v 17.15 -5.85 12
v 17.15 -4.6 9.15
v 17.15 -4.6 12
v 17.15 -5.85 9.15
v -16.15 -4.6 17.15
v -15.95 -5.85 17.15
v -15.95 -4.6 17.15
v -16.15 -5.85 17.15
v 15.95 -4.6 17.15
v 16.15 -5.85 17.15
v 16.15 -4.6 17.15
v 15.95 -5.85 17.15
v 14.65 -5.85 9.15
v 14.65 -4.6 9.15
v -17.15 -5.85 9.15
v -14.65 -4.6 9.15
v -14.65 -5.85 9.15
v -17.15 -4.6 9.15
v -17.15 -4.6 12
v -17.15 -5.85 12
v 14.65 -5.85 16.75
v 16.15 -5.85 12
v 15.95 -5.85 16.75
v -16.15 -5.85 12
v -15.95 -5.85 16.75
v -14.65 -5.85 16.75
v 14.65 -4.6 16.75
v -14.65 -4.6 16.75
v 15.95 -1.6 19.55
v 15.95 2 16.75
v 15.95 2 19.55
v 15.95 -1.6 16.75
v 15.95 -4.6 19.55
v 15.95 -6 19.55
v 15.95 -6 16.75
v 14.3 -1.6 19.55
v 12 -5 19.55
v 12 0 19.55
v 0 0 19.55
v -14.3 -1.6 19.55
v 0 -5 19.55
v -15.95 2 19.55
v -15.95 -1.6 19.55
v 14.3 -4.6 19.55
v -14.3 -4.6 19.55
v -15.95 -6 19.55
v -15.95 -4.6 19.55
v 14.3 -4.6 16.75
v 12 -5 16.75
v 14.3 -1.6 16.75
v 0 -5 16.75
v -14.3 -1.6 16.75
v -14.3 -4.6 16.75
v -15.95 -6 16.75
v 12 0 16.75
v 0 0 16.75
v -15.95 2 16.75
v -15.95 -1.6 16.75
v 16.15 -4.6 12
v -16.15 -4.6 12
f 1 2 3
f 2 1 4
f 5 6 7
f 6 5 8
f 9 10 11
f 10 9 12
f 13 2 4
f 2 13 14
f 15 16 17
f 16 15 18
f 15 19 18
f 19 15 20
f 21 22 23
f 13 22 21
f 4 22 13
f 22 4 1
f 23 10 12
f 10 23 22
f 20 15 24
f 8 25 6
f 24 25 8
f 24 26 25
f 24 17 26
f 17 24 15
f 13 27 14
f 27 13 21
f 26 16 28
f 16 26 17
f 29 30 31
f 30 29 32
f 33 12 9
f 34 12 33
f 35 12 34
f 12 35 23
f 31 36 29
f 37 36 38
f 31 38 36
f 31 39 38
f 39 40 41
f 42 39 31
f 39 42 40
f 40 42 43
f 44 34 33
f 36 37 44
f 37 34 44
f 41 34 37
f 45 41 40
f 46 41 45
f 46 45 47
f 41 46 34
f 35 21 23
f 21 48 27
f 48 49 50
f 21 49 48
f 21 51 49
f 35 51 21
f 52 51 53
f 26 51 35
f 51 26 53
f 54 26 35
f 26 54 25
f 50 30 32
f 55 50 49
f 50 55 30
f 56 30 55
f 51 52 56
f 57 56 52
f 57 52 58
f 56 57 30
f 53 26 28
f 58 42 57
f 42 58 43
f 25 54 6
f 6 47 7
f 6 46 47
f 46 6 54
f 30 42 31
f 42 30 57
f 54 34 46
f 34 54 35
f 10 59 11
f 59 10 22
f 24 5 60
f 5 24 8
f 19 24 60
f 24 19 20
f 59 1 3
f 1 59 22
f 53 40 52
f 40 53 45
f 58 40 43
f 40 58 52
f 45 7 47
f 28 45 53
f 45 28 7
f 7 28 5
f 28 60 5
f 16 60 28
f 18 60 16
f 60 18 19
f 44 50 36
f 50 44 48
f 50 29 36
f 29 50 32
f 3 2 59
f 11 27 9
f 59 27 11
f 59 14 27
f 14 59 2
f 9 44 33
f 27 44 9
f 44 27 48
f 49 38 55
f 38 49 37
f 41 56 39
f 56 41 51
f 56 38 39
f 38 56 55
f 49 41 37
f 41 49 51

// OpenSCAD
// file: usb_screen.scad
//长宽高
ma=32.3;//横着
mb=34.3;//竖着
mc=4.2;//厚度

l1=1.6;//屏幕顶部
l2=2;//两边
l3=4.8;//屏幕底部

ll=3;//默认槽宽


difference()
{
    cube([ma+4,mc+4,mb+5],true);
    union()
    {
        cube([ma,mc,mb],true);//中间的空间
        translate([0,0,-1.5])//屏幕排线
            cube([ma-10,mc,mb],true);
        
        translate([0,3,0])//前面扣洞
            cube([ma-l2*2,mc,mb-l3*2],true);
        translate([0,3,mb/4])//前面再扣洞
            cube([ma-l2*2,mc,mb/2-l2*2],true);
        translate([0,-3,0])//背面扣洞
            cube([ma-ll,mc,mb-ll],true);
        
        translate([0,0,5])//上面扣洞
            cube([ma,mc,mb],true);
        translate([0,-3,10])//去掉一个梁
            cube([ma-ll,mc,mb-ll],true);
    }
}
translate([0,-7.5,0])//背面
    cube([ma+4,2,mb+5],true);

difference()
{
    translate([0,-5,0])//背面
        cube([ma+4,3,mb+5],true);
    translate([0,-5,0])//背面
    union()
    {
        translate([0,0,5])//上面扣洞
            cube([ma,mc,mb+10],true);
        translate([0,0,10])//卡扣
            cube([ma+5,4,4],true);
    }
}
// main file
//长宽高
ma=32.3;//横着
mb=34.3;//竖着
mc=4.2;//厚度

l1=1.6;//屏幕顶部
l2=2;//两边
l3=4.8;//屏幕底部

ll=3;//默认槽宽


difference()
{
    union()
    {
        translate([0,-2,mb/2+1])
            cube([ma-0.4,mc+4-0.2,2.8],true);
        difference()
        {
            translate([0,-5,mb/2-4])
                cube([ma+2,1.7,8],true);
            translate([0,-5,mb/2-4])
                cube([ma-3,1.8,8.2],true);
        }
    }
    union()
    {
        include<usb_screen.scad>;
        translate([-16.8,-3.1,5])
            cube([5,ll,mb],true);//凹槽一侧
        translate([16.8,-3.1,5])
            cube([5,ll,mb],true);//凹槽另一侧
        translate([6,-2.5,5])
            cube([12,5,mb],true);//usb口
    }
}
